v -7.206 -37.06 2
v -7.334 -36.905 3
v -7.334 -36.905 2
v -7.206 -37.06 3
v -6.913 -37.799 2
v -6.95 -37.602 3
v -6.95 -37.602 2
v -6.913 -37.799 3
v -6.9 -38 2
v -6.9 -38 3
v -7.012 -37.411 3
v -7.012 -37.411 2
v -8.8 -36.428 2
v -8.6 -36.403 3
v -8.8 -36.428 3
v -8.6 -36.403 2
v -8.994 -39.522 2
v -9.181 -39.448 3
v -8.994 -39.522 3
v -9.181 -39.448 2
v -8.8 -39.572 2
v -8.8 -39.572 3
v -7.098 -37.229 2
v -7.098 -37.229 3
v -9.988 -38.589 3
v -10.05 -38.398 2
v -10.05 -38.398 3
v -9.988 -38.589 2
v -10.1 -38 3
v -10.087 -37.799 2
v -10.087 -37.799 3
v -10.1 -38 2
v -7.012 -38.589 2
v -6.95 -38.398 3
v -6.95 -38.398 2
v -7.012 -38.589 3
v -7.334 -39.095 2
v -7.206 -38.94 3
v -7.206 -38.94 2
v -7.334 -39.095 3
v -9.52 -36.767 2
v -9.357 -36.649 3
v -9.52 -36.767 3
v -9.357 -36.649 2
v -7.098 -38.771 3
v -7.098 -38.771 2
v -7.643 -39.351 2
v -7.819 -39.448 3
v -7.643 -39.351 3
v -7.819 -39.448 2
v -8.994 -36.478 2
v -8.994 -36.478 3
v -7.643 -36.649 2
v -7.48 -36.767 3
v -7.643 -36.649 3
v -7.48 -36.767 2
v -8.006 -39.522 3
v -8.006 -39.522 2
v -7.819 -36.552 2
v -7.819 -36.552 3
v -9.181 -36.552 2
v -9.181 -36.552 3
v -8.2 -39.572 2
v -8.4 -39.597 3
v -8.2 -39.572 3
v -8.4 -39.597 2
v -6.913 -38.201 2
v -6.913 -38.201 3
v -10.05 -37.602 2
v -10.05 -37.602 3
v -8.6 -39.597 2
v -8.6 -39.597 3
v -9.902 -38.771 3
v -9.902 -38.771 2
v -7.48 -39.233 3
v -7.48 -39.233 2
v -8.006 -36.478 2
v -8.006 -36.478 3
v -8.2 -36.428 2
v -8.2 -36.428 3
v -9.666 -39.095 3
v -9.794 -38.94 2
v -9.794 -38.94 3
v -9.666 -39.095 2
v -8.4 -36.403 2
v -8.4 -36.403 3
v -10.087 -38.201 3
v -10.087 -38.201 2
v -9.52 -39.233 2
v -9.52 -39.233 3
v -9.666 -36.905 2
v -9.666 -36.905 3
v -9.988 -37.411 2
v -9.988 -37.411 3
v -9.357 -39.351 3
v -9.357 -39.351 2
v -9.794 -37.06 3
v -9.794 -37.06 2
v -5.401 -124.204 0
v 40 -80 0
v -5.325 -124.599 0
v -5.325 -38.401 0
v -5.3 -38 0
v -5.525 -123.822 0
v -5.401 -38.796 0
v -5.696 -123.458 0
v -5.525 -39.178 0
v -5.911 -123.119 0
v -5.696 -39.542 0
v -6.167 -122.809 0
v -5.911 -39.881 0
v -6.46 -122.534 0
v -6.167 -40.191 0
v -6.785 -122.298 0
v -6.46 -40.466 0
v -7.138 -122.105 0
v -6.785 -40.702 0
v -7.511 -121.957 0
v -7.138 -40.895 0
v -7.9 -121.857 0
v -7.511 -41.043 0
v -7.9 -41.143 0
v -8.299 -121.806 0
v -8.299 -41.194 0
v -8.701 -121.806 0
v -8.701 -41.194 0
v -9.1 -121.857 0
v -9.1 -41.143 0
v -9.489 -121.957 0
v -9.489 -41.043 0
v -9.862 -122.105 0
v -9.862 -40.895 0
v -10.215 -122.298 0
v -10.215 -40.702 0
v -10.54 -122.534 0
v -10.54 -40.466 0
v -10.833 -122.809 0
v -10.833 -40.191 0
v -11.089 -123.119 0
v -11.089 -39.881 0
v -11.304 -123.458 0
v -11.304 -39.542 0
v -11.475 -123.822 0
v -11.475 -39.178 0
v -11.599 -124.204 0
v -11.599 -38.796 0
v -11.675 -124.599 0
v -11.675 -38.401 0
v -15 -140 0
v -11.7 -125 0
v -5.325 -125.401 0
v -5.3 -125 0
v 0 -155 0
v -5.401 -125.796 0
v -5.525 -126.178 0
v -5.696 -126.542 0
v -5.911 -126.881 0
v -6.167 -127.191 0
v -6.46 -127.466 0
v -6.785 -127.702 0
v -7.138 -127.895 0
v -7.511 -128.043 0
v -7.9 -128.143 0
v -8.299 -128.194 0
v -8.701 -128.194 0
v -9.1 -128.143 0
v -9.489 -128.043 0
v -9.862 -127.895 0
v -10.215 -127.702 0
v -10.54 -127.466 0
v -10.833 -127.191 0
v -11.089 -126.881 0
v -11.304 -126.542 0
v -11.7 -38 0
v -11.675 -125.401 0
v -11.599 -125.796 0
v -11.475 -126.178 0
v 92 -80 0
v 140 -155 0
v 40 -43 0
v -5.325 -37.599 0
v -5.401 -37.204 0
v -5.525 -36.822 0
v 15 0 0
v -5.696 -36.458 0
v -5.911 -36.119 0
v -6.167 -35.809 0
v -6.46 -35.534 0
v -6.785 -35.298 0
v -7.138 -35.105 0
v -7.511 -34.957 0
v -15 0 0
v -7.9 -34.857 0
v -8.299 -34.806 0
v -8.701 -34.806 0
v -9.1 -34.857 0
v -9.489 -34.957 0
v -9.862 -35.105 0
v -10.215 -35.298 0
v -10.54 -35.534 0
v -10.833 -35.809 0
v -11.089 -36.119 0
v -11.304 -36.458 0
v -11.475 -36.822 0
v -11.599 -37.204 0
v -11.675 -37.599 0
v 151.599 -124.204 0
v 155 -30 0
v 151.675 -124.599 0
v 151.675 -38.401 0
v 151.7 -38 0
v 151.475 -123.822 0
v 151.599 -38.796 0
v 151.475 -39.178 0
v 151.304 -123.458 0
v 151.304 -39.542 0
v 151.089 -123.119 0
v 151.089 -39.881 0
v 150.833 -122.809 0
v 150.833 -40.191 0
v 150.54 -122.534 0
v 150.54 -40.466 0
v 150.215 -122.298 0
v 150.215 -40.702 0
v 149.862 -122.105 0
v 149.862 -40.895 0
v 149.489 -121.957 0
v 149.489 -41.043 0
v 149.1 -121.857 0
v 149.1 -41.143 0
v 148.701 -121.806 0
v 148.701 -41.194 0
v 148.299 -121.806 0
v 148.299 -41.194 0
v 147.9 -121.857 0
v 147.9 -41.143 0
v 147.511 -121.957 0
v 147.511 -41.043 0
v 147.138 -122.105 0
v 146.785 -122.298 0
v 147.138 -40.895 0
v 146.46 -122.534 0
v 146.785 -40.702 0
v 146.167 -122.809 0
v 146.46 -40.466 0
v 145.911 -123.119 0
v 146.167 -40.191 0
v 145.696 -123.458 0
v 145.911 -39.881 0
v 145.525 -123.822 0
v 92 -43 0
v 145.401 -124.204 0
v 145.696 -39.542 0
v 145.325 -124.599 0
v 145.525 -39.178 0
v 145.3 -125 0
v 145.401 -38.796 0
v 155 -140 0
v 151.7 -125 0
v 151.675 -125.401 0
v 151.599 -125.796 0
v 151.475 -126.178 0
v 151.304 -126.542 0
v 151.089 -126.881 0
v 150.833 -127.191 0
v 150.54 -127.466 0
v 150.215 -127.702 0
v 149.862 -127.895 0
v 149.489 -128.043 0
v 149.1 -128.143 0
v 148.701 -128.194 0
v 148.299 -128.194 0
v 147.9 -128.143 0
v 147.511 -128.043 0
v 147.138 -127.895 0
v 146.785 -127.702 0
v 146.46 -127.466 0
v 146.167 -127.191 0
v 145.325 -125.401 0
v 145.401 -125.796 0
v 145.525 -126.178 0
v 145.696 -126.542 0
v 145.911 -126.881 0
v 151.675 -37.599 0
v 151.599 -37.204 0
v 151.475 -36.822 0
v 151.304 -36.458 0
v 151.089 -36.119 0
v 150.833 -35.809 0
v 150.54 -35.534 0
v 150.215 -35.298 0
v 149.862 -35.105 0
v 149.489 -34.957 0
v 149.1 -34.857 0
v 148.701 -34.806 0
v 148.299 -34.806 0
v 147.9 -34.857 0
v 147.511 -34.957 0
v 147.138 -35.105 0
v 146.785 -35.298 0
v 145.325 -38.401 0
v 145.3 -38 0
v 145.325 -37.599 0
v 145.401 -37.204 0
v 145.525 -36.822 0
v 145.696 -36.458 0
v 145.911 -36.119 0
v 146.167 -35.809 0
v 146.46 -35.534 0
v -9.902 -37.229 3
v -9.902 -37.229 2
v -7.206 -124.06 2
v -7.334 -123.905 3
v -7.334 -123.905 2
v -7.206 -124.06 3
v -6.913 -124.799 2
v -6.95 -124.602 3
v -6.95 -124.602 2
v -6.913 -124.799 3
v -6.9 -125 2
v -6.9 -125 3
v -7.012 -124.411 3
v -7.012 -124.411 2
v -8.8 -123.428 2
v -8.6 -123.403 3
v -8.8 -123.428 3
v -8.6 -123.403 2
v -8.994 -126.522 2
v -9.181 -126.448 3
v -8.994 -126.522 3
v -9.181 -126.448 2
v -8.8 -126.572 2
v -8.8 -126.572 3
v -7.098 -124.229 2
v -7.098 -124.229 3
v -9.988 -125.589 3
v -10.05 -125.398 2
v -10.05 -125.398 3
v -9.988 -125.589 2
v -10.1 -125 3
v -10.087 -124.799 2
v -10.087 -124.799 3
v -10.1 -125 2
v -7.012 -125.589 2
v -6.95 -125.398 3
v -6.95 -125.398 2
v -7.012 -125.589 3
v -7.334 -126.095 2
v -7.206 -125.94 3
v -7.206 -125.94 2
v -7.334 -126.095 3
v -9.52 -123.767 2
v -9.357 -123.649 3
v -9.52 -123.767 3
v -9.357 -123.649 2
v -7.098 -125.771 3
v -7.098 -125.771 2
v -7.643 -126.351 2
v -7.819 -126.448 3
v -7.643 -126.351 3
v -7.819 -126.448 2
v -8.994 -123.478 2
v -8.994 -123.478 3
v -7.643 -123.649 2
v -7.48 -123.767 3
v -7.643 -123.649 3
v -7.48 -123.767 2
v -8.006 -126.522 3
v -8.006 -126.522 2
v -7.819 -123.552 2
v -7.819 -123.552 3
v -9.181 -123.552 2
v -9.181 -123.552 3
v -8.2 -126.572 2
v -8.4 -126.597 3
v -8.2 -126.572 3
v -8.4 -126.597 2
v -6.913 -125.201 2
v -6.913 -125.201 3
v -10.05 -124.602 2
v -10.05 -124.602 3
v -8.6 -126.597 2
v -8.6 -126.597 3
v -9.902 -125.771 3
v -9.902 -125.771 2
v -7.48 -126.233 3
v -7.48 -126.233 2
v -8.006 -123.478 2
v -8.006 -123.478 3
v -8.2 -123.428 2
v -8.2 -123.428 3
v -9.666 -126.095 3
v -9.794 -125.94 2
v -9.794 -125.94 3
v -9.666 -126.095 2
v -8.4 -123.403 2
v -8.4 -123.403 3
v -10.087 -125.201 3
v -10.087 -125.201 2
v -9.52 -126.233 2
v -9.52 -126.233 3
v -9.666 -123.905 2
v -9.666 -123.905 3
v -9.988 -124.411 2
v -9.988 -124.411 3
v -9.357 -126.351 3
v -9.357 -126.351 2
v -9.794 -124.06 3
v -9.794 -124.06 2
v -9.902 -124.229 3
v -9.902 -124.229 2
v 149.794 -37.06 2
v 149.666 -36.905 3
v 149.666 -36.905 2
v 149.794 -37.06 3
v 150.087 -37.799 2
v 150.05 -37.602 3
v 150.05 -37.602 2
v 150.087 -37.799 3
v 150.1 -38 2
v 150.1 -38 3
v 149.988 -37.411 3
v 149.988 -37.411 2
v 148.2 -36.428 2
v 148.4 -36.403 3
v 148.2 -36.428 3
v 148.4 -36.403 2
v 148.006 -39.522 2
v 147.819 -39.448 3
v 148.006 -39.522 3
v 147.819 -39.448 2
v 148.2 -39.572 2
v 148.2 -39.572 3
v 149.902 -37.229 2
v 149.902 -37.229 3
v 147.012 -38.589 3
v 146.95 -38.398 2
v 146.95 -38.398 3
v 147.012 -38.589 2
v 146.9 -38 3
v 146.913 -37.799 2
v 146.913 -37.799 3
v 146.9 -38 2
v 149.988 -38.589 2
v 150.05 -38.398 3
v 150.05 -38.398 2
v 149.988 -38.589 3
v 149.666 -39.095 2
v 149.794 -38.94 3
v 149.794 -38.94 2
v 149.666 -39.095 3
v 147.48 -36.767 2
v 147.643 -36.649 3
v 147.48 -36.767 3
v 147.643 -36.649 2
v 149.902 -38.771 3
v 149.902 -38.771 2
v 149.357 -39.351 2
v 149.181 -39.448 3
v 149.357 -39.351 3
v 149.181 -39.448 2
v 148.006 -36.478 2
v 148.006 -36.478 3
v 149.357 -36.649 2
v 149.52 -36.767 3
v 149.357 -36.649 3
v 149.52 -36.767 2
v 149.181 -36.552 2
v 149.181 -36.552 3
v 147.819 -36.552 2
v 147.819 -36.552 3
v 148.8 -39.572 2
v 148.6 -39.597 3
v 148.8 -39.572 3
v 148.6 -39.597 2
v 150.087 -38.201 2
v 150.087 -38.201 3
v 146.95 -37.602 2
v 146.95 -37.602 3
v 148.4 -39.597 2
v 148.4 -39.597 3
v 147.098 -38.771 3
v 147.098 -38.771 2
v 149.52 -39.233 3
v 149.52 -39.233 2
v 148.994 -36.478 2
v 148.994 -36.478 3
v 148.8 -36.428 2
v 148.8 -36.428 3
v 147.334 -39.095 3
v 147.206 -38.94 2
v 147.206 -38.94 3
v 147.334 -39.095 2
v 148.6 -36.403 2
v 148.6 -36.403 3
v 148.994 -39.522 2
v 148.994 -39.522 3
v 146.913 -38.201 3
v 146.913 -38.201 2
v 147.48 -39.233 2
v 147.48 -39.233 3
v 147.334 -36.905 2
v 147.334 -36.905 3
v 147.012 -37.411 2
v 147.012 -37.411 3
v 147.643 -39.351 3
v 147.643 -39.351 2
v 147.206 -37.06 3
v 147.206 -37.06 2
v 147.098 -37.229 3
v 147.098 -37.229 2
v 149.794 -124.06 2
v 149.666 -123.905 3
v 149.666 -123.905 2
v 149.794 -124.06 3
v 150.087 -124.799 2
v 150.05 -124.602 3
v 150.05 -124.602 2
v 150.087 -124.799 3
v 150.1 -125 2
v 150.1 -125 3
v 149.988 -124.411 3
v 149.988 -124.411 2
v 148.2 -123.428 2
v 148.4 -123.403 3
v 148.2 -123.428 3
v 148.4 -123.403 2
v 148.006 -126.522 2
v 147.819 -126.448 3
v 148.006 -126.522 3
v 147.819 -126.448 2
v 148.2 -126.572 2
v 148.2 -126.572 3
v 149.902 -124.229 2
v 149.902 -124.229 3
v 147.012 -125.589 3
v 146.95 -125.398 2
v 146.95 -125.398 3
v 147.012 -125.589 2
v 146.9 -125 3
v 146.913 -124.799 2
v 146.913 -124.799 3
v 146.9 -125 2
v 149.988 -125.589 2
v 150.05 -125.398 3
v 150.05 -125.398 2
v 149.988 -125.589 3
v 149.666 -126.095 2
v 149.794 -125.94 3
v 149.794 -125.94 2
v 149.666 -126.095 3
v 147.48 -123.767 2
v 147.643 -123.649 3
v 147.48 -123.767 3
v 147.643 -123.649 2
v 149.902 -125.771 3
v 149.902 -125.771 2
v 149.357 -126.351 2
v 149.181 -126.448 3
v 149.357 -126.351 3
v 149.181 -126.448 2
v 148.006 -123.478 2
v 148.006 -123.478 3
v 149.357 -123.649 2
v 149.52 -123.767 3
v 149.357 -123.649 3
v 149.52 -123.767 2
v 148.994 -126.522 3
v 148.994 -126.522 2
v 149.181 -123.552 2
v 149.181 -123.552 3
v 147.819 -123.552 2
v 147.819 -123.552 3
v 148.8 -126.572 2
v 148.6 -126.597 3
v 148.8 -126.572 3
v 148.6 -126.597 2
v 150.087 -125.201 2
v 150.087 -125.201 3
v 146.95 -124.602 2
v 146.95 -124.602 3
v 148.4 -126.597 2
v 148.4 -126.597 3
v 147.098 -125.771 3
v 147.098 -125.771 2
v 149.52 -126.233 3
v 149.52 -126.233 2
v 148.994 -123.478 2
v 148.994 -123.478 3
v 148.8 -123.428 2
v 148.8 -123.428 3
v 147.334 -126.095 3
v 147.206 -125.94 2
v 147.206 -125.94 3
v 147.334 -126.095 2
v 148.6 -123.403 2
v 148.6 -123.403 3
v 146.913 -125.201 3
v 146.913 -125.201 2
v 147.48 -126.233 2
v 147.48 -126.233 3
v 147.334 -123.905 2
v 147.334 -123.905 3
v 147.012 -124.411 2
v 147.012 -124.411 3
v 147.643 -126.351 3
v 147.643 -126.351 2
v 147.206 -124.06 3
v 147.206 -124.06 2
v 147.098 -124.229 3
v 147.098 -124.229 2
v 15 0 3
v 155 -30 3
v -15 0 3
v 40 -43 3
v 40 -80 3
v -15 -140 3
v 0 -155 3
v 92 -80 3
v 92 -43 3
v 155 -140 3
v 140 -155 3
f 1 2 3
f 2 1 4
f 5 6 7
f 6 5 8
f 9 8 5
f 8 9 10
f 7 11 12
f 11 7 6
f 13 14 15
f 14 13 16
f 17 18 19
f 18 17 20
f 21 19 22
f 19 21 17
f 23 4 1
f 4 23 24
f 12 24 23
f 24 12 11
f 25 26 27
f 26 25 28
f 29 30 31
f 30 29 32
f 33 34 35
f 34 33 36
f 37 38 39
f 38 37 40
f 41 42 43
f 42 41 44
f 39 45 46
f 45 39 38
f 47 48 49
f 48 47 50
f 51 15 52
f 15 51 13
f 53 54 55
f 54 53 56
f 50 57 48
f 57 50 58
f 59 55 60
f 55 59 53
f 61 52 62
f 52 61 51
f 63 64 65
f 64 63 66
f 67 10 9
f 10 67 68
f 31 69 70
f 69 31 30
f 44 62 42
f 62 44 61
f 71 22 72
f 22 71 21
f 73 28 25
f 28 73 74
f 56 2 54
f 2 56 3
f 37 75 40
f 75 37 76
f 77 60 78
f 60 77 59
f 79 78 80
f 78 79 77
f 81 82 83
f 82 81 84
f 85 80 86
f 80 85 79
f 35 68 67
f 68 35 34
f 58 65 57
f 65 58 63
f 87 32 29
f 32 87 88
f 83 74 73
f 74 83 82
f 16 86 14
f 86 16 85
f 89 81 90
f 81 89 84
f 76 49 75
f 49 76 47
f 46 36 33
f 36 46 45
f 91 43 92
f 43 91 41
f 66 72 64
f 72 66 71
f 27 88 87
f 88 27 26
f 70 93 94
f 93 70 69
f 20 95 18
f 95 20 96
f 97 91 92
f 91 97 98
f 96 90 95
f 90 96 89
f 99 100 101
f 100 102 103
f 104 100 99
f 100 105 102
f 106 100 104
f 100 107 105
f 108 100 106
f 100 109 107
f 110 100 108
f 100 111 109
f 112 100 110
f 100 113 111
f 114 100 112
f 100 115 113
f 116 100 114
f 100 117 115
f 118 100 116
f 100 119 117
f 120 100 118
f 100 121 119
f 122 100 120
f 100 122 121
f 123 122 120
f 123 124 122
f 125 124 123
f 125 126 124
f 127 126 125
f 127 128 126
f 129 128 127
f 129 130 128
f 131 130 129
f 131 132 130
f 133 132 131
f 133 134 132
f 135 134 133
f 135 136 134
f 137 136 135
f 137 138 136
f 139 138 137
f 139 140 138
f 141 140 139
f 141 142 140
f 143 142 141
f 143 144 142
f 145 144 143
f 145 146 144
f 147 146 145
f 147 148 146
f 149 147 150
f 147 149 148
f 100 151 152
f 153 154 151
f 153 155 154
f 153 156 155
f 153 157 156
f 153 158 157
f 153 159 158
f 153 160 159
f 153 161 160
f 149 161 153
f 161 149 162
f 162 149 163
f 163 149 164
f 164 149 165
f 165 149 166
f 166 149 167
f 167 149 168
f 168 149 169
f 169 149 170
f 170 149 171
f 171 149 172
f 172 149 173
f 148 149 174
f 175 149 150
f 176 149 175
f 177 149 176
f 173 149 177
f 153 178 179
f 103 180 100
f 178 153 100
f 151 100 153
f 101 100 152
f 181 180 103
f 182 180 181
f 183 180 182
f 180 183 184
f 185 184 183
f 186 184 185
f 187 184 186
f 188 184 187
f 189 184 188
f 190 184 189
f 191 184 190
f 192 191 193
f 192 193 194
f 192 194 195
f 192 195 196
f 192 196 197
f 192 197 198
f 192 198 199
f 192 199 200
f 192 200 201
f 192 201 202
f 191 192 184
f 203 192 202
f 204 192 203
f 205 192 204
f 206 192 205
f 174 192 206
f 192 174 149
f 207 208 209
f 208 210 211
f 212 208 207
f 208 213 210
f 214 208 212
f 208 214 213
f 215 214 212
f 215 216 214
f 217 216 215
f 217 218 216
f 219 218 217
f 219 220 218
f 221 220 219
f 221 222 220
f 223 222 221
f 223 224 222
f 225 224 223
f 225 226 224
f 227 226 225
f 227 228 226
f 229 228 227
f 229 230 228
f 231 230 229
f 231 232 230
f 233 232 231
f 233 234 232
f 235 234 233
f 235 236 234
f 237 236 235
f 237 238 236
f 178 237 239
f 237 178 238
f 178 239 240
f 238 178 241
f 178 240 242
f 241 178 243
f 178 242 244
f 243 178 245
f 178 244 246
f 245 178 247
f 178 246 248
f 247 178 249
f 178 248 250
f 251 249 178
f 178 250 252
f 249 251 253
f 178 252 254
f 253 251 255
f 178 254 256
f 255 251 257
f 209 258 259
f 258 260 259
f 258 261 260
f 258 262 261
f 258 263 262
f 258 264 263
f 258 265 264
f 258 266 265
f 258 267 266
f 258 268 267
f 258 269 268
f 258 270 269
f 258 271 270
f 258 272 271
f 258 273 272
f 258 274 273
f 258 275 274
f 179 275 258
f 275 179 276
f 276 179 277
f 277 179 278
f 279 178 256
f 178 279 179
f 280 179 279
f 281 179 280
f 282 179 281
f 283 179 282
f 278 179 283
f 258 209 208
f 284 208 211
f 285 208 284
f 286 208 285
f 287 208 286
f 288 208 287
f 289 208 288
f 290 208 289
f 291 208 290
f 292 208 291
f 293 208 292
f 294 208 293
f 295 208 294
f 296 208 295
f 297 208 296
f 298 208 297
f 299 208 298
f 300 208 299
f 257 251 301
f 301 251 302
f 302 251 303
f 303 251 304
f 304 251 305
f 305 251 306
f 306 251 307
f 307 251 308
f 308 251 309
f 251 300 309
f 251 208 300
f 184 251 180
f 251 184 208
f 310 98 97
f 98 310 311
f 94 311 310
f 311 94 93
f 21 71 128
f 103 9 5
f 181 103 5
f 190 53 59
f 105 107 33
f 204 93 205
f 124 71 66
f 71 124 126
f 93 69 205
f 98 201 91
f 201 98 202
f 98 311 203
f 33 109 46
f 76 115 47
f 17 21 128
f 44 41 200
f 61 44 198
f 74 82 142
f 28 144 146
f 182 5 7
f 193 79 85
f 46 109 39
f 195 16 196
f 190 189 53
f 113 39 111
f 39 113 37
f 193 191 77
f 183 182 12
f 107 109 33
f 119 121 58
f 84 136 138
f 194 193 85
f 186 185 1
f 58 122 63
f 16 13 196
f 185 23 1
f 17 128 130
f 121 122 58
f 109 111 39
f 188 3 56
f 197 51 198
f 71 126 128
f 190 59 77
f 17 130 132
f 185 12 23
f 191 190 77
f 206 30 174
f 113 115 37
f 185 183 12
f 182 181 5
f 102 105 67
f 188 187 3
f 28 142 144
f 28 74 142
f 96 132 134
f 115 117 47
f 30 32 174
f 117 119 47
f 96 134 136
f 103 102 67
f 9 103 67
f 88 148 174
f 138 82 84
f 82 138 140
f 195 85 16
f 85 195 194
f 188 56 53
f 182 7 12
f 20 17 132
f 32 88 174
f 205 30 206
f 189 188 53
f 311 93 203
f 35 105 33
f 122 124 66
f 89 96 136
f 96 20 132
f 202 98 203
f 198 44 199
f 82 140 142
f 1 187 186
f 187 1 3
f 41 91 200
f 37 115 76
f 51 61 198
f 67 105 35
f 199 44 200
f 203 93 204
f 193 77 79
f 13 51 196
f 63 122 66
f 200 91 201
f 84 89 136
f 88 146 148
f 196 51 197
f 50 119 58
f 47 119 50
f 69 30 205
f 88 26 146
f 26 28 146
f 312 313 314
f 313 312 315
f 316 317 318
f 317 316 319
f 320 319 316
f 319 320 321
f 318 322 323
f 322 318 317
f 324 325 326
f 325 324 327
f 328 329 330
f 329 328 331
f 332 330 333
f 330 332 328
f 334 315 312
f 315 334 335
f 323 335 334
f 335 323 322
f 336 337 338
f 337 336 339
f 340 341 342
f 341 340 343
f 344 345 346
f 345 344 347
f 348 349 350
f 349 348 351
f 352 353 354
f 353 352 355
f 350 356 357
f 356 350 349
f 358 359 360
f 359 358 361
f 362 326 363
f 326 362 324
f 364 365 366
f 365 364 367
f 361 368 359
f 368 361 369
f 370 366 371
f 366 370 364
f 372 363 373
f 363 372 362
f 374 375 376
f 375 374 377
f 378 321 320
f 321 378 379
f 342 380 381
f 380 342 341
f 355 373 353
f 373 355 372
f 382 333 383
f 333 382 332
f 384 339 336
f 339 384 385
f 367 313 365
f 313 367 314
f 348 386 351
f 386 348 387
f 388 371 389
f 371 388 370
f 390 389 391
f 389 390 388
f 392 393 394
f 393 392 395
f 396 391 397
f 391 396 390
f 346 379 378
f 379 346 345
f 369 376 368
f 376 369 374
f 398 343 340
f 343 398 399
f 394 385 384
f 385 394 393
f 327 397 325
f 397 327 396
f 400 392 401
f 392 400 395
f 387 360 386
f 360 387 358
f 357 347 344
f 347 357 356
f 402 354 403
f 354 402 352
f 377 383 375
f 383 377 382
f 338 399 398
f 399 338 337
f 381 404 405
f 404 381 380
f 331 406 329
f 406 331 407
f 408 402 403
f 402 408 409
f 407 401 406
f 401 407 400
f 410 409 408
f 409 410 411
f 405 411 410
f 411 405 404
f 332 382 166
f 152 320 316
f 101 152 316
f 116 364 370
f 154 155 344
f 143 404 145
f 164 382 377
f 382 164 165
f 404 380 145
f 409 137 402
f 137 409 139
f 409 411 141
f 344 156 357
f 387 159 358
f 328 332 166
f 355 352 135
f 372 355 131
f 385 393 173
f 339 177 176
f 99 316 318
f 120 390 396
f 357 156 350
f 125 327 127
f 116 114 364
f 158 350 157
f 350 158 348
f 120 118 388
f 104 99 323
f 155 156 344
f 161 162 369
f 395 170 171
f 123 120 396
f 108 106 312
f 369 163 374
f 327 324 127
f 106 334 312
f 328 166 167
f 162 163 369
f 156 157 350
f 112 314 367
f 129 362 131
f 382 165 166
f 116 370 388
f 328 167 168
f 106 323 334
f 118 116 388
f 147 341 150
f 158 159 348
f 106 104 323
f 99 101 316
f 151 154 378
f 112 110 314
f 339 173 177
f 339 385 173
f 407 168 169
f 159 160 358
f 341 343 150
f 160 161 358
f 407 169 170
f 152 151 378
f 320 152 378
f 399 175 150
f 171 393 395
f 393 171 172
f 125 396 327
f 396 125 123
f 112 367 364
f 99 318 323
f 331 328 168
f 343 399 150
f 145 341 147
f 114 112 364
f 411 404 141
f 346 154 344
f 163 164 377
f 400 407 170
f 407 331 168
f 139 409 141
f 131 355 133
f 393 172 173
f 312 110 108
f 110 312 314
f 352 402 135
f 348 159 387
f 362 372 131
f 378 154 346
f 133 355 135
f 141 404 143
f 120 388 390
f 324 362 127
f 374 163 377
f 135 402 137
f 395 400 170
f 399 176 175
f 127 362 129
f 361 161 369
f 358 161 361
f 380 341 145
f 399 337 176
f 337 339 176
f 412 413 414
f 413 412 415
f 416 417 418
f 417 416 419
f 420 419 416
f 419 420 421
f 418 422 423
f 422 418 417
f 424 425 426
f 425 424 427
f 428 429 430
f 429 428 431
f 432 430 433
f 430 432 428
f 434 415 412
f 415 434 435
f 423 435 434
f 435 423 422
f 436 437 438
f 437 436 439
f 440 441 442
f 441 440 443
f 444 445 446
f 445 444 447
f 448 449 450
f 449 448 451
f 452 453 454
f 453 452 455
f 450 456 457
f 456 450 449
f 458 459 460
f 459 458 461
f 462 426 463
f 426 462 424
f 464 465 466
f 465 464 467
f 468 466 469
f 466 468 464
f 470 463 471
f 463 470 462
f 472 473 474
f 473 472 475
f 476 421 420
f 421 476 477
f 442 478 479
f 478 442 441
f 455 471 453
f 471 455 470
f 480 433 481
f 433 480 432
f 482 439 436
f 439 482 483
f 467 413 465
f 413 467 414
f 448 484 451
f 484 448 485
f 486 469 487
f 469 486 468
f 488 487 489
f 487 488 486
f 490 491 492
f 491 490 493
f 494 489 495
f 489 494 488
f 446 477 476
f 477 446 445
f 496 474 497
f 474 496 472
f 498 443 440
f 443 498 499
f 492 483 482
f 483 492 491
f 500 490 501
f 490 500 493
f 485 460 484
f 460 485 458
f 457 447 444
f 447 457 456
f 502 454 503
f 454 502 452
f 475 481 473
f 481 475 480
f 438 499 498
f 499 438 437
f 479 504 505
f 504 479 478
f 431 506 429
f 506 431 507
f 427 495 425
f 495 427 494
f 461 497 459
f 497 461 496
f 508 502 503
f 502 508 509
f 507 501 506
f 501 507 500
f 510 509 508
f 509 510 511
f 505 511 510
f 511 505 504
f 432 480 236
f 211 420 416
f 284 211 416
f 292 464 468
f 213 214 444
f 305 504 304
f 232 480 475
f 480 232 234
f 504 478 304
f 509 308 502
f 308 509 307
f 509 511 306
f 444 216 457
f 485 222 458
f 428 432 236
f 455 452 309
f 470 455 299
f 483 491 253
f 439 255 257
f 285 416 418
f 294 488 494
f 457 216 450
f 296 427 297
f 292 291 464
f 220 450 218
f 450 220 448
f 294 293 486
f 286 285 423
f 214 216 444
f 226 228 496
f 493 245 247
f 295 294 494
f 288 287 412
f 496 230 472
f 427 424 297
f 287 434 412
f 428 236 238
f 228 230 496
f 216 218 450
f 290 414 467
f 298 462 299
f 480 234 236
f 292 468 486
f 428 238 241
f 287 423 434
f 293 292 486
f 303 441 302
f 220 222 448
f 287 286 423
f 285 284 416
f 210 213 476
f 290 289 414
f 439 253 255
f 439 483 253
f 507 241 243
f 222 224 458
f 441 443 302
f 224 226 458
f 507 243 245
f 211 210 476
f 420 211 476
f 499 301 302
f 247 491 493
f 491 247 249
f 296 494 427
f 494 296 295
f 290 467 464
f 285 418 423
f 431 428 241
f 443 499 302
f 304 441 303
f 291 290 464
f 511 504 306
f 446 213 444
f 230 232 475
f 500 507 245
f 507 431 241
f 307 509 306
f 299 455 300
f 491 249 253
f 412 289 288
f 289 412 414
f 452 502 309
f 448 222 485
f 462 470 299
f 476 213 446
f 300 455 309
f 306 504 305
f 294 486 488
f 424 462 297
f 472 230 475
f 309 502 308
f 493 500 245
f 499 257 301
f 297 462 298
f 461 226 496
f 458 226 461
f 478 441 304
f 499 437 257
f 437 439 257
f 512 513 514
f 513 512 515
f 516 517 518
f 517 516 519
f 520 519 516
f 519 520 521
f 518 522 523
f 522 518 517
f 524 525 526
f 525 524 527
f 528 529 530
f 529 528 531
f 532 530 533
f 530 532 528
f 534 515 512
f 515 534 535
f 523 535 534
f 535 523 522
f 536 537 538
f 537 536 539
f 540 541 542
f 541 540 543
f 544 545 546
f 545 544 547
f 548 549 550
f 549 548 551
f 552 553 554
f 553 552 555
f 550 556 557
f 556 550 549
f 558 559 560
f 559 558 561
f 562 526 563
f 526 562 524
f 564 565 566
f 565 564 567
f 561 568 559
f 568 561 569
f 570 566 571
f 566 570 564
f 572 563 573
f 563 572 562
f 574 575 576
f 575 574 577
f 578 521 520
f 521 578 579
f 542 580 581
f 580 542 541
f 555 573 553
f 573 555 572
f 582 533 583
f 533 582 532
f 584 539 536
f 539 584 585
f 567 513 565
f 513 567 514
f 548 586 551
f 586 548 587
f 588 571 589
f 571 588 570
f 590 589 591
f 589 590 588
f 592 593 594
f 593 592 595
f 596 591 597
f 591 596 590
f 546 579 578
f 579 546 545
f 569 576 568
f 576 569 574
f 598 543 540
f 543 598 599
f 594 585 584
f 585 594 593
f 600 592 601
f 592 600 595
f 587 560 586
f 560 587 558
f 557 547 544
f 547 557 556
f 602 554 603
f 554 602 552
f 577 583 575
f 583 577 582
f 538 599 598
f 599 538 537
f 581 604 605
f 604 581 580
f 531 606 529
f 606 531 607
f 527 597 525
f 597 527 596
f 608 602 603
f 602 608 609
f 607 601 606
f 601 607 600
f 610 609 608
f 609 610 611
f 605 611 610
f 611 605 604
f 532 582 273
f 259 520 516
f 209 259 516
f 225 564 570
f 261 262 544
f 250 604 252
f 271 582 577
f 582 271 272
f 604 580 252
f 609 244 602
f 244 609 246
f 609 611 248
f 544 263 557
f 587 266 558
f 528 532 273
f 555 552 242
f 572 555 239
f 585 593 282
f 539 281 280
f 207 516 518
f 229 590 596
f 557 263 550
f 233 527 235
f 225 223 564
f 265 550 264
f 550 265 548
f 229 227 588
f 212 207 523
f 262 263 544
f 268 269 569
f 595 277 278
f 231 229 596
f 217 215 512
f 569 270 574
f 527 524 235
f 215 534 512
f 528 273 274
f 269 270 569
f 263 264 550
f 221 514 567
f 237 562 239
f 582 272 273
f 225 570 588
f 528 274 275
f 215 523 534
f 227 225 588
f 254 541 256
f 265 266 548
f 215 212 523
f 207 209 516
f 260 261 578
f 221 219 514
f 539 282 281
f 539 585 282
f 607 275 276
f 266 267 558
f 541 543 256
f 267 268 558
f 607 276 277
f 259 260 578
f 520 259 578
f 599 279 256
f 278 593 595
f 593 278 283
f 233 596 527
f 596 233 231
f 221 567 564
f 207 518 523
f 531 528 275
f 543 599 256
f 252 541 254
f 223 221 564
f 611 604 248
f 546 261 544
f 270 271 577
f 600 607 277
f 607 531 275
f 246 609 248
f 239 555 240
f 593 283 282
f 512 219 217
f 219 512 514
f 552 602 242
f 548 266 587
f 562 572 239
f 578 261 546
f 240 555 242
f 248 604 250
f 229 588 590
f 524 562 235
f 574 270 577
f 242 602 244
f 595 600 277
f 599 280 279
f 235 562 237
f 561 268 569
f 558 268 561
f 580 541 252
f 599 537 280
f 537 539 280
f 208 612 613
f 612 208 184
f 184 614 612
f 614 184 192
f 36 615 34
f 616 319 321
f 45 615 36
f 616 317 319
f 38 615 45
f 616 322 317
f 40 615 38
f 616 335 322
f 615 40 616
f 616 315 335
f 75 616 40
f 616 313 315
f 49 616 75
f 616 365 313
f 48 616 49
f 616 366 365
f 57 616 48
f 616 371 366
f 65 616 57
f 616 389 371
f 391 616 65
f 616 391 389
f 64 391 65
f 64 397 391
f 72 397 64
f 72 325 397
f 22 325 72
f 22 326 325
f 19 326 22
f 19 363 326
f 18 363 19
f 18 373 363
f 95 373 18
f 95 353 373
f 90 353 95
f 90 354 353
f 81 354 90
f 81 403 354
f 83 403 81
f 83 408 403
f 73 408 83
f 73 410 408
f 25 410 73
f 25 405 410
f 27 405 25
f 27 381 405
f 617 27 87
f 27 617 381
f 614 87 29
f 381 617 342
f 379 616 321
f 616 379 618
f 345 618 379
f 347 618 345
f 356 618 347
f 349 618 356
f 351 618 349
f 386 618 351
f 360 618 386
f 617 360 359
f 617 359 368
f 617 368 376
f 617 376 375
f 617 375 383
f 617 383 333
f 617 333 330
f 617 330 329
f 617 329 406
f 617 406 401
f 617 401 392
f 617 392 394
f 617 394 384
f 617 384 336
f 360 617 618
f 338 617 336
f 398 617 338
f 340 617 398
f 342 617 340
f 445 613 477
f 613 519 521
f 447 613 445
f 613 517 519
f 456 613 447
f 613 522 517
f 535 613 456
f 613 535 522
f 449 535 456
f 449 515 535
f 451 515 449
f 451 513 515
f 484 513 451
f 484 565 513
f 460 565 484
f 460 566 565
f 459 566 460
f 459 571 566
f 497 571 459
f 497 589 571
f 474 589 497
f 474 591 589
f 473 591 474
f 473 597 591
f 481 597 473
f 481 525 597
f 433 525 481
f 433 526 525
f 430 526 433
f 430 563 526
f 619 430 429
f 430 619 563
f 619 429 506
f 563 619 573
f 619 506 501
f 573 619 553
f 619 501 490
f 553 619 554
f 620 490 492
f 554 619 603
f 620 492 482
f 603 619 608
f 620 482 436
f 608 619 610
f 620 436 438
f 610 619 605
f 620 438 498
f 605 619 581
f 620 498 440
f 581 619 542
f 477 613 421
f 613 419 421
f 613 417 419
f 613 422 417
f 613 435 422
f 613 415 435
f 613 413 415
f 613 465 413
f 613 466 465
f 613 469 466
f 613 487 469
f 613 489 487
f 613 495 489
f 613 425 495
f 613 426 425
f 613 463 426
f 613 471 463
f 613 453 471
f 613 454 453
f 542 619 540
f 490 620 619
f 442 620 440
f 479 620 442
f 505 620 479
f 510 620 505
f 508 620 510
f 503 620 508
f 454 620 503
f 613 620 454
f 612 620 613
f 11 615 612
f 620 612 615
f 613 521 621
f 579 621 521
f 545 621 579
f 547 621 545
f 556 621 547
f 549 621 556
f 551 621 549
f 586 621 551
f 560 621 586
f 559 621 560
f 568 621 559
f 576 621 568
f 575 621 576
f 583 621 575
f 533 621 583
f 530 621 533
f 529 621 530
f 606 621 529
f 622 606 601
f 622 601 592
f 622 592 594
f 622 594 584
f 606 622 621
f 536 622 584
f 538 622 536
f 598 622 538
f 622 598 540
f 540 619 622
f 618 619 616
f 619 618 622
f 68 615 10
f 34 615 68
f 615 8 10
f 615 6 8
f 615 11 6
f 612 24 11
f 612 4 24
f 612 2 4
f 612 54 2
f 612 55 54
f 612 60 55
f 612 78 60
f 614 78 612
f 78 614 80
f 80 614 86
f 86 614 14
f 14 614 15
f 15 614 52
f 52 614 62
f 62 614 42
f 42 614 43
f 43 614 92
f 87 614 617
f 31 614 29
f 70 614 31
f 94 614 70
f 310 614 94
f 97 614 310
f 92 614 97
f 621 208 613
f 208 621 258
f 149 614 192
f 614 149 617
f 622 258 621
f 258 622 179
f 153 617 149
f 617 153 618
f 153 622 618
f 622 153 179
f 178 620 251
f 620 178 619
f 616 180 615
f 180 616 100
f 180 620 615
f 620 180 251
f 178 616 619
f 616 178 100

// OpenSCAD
// file: body/holes/power_switch.scad
include<../../global_constants.scad>

module power_switch(){
        translate([ -(power_switch_size_x/2), -power_switch_size_y, power_switch_z])cube([power_switch_size_x, power_switch_size_y, power_switch_size_y]);
}
// file: lit/lit_holes.scad
include<../global_constants.scad>;


module lit_battery_hole(){
    translate([40,-80,0]) cube([52,37,lit_height]);
}
module lit_holes(){
    //top left anchor
    base_hole(body_left_anchor_x, anchor_top_y);
    
    //bottom left anchor
    base_hole(body_left_anchor_x, anchor_bottom_y);
    
    //top right anchor
    base_hole(body_right_anchor_x, anchor_top_y);
    
    //bottom right anchor
    base_hole(body_right_anchor_x, anchor_bottom_y);
}

module base_hole(x, y){
    translate([x, y, 0]){
        cylinder(anchor_height, screw_size, screw_size);
        cylinder(screw_top_height, screw_size*2, screw_size);
    }
}
// file: body/body_bottom.scad
include<../global_constants.scad>
use<holes/power_switch.scad>

//main body bottom part for walls

module body_bottom(){
    difference(){
        body_bottom_solid();
        
        translate([wall_size_offset_x,-wall_size_offset_y, 0]){
            scale([1-(wall_size/100), 1-(wall_size/100),1]){
                body_bottom_solid();
            }
        }
        
        power_switch();
    }

    module body_bottom_solid(){
        hull(){
            translate([-cylinder_radius, -body_size, -body_height])
            cube([cylinder_radius*2,body_size,body_height]);

            translate([-cylinder_radius + body_size, -body_size, -body_height])
            cube([cylinder_radius*2,body_size - body_size_diff,body_height]);
                
            translate([0, -body_size-cylinder_radius, -body_height])
            cube([body_size ,cylinder_radius,body_height]);
        }
    }
}
// file: global_constants.scad
$fn=50;

// Body
body_size=140;
body_size_diff=30;
cylinder_radius=15;
body_height=15;

wall_size=4;
wall_size_offset_x= (body_size*(wall_size/100))/2;
wall_size_offset_y= ((body_size+cylinder_radius)*(wall_size/100))/2;

// Anchors
anchor_outer_size=4.5;
anchor_inner_size=2.5;

anchor_inner_size_margin=0.4;

anchor_height=7;
anchor_height_margin=2;

anchor_top_y=-38;
anchor_bottom_y=-125;

body_left_anchor_x = -cylinder_radius + anchor_outer_size + anchor_outer_size - anchor_inner_size;

body_right_anchor_x = body_size + cylinder_radius - (anchor_outer_size + anchor_outer_size - anchor_inner_size);

// Lit
screw_size = 1.6;
screw_top_height = 2;

lit_height = 3;

// Speaker
speaker_size=28.2;
speaker_size_y=31.2;
speaker_x=5;
speaker_y=-43;

// Screen
screen_size=32.2;
screen_x=58;
screen_y=-75;

// Power switch
power_switch_size_x=13.4;
power_switch_size_y=9.2;
power_switch_z=-power_switch_size_y;

// Buttons
button_size=12.5;
button_x_margin=5;
button_starting_x=3;

button_x_placement=button_size + button_x_margin;
button_y_placement=-100;
button_y_second_row=30;

confirm_button_x=body_size - button_size-2;
confirm_button_y=-60;

// Leds
led_size=2.6;
led_height=10;
// main file
include<global_constants.scad>;

use<body/body_bottom.scad>;
use<lit/lit_holes.scad>;

difference(){
    hull() linear_extrude(height = lit_height) projection() body_bottom();
  
    lit_holes();
    
    lit_battery_hole();
}
